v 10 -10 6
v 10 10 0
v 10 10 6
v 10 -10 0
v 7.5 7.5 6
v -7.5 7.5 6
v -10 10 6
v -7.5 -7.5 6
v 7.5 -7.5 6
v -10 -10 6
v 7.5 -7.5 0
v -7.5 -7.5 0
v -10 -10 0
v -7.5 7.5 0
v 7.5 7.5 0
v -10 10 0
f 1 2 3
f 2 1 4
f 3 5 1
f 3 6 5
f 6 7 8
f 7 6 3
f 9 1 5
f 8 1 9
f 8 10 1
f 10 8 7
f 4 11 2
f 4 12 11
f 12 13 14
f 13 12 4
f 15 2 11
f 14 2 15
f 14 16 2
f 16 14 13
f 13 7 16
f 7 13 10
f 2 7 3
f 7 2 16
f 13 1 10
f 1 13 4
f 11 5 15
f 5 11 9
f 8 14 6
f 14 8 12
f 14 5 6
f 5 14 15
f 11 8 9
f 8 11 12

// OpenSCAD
dual_box(-1);

$fn=64;

module dual_box(nozzle = 0){
    if(nozzle >= 0){
        difference(){
            color([.8,.8,.8]) union(){
                translate([0,0,1]) cube([25,25,2], center=true);
                translate([0,0,3]) cube([10,10,6], center=true);
                translate([-10,-10,0]) cylinder(r=2, h=3);
            }
            dual_box(nozzle=-1);
        }
    }
    
    if(nozzle <= 0){
        color([.2,.2,.2]) difference(){
            translate([0,0,3]) cube([20,20,6], center=true);
            translate([0,0,3]) cube([15,15,8], center=true);
        }
    }
}
